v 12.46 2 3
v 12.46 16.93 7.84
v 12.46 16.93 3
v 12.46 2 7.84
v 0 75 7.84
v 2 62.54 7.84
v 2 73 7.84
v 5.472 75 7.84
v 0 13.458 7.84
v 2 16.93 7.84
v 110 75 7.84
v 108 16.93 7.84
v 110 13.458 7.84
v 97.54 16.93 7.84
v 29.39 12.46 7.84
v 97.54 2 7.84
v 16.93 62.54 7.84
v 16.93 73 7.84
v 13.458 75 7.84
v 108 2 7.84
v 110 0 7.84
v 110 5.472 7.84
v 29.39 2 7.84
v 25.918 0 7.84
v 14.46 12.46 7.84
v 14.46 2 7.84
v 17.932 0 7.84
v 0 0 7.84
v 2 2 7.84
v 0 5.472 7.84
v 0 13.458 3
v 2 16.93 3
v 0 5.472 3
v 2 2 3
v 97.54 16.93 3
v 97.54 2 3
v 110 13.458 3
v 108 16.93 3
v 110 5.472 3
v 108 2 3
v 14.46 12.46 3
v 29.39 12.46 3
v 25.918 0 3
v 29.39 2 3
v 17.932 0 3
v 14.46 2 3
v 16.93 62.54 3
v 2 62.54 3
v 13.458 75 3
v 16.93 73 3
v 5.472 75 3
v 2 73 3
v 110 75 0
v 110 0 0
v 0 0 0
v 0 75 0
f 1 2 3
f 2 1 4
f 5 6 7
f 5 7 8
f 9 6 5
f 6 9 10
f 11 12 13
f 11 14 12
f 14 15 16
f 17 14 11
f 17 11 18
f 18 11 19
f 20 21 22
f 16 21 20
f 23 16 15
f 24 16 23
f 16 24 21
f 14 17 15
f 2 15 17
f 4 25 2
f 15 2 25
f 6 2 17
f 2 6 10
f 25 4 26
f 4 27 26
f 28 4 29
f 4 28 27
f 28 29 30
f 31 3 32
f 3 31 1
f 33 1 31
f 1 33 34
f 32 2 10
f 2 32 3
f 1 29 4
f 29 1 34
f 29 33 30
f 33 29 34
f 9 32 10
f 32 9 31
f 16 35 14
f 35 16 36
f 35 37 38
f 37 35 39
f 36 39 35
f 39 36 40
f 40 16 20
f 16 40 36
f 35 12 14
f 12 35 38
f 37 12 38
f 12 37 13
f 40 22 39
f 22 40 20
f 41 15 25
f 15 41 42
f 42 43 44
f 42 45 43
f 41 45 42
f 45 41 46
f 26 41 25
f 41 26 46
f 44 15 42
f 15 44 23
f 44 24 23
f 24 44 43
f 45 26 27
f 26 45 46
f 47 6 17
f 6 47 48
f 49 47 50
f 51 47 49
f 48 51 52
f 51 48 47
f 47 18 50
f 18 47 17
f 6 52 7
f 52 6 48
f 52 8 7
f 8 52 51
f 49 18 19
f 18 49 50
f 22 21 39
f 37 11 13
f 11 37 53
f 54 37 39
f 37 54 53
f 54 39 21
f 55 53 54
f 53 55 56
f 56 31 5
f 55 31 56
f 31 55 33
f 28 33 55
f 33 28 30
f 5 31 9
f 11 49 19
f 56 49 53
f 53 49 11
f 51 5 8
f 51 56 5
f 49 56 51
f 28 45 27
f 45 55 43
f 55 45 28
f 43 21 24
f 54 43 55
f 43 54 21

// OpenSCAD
// file: SquareWithTrianglePileLib.scad
module LeftPile(wallThickness, totalHeight, singlePileHeight, singlePileWidth, singlePileLength, pileCount, openingSizePercent = .5){
    pileHeight = (pileCount * singlePileHeight) + .5;
    lengthOpeningSize = .00001;
    widthOpeningSize = singlePileWidth * openingSizePercent;
    blockerSize = (singlePileWidth - widthOpeningSize) / 2;
    
    translate([wallThickness, wallThickness, totalHeight - pileHeight])
        cube([singlePileLength, singlePileWidth, pileHeight]);
    
    y = singlePileWidth;
    a = 4.3;
    height = pileHeight;
    translate([wallThickness, wallThickness, totalHeight - pileHeight])
        rotate([0,0,90])
            polyhedron(
                points = 
                [
                    [0,0,0],
                    [y,0,0],
                    [y/2,a,0],
                    [0,0,height],
                    [y,0,height],
                    [y/2,a,height],
                ],
                faces = 
                [
                    [0,1,2],
                    [3,4,1,0],
                    [3,5,4],
                    [4,5,2,1],
                    [5,3,0,2]
                ]);   
    
//    translate([-.00001, wallThickness + (blockerSize), 0])
//        cube([wallThickness + lengthOpeningSize, widthOpeningSize, totalHeight]);
}

module RightPile(wallThickness, totalHeight, singlePileHeight, singlePileWidth, singlePileLength, pileCount, openingSizePercent = .75){
    translate([0, wallThickness + wallThickness + singlePileWidth, 0])
        rotate([0, 0, 180])
            LeftPile(wallThickness, totalHeight, singlePileHeight, singlePileWidth, singlePileLength, pileCount, openingSizePercent);
}

module BottomPile(wallThickness, totalHeight, singlePileHeight, singlePileWidth, singlePileLength, pileCount, openingSizePercent = .75){
    translate([wallThickness + wallThickness + singlePileWidth, 0, 0])
        rotate([0, 0, 90])
            LeftPile(wallThickness, totalHeight, singlePileHeight, singlePileWidth, singlePileLength, pileCount, openingSizePercent);
}

module TopPile(wallThickness, totalHeight, singlePileHeight, singlePileWidth, singlePileLength, pileCount, openingSizePercent = .75){
        rotate([0, 0, 270])
            LeftPile(wallThickness, totalHeight, singlePileHeight, singlePileWidth, singlePileLength, pileCount, openingSizePercent);
}
// file: SpaceAlertThreatTokensLib.scad
include<SquareWithTrianglePileLib.scad>
//side of triangle: 7.85
//sin x = o/h = 
singleThreatTokenPileHeight = 2.17;
singleThreatTokenPileWidth = 14.23 + .7;
singleThreatTokenPileLength = 9.76 + .7;

module LeftThreatTokenPile(wallThickness, totalHeight, threatTokenPileCount){
    LeftPile(
        wallThickness,
        totalHeight,
        singleThreatTokenPileHeight,
        singleThreatTokenPileWidth,
        singleThreatTokenPileLength,
        threatTokenPileCount);
}

module RightThreatTokenPile(wallThickness, totalHeight, threatTokenPileCount){
    RightPile(
        wallThickness,
        totalHeight,
        singleThreatTokenPileHeight,
        singleThreatTokenPileWidth,
        singleThreatTokenPileLength,
        threatTokenPileCount);
}

module BottomThreatTokenPile(wallThickness, totalHeight, threatTokenPileCount){
    BottomPile(
        wallThickness,
        totalHeight,
        singleThreatTokenPileHeight,
        singleThreatTokenPileWidth,
        singleThreatTokenPileLength,
        threatTokenPileCount);
}

module TopThreatTokenPile(wallThickness, totalHeight, threatTokenPileCount){
    TopPile(
        wallThickness,
        totalHeight,
        singleThreatTokenPileHeight,
        singleThreatTokenPileWidth,
        singleThreatTokenPileLength,
        threatTokenPileCount);
}

function threatTokenPileHeight(threatTokenPileCount) =
    (threatTokenPileCount * singleThreatTokenPileHeight) + .5;
// main file
include<SpaceAlertThreatTokensLib.scad>
difference() {
    testBoxHeight = threatTokenPileHeight(2) + 3;
    testBoxLength = 110;
    testBoxWidth = 75;
    wallThickness = 2;
    
    cube([testBoxLength, testBoxWidth, testBoxHeight]);
    LeftThreatTokenPile(wallThickness, testBoxHeight, 2);
//    translate([100 - (15.05 + .8), 0, 0])
    translate([testBoxLength, 0, 0])
        RightThreatTokenPile(wallThickness, testBoxHeight, 2);
    translate([singleThreatTokenPileLength + wallThickness, 0, 0])
        BottomThreatTokenPile(wallThickness, testBoxHeight, 2);
    translate([0, testBoxWidth, 0])
        TopThreatTokenPile(wallThickness, testBoxHeight, 2);
}
